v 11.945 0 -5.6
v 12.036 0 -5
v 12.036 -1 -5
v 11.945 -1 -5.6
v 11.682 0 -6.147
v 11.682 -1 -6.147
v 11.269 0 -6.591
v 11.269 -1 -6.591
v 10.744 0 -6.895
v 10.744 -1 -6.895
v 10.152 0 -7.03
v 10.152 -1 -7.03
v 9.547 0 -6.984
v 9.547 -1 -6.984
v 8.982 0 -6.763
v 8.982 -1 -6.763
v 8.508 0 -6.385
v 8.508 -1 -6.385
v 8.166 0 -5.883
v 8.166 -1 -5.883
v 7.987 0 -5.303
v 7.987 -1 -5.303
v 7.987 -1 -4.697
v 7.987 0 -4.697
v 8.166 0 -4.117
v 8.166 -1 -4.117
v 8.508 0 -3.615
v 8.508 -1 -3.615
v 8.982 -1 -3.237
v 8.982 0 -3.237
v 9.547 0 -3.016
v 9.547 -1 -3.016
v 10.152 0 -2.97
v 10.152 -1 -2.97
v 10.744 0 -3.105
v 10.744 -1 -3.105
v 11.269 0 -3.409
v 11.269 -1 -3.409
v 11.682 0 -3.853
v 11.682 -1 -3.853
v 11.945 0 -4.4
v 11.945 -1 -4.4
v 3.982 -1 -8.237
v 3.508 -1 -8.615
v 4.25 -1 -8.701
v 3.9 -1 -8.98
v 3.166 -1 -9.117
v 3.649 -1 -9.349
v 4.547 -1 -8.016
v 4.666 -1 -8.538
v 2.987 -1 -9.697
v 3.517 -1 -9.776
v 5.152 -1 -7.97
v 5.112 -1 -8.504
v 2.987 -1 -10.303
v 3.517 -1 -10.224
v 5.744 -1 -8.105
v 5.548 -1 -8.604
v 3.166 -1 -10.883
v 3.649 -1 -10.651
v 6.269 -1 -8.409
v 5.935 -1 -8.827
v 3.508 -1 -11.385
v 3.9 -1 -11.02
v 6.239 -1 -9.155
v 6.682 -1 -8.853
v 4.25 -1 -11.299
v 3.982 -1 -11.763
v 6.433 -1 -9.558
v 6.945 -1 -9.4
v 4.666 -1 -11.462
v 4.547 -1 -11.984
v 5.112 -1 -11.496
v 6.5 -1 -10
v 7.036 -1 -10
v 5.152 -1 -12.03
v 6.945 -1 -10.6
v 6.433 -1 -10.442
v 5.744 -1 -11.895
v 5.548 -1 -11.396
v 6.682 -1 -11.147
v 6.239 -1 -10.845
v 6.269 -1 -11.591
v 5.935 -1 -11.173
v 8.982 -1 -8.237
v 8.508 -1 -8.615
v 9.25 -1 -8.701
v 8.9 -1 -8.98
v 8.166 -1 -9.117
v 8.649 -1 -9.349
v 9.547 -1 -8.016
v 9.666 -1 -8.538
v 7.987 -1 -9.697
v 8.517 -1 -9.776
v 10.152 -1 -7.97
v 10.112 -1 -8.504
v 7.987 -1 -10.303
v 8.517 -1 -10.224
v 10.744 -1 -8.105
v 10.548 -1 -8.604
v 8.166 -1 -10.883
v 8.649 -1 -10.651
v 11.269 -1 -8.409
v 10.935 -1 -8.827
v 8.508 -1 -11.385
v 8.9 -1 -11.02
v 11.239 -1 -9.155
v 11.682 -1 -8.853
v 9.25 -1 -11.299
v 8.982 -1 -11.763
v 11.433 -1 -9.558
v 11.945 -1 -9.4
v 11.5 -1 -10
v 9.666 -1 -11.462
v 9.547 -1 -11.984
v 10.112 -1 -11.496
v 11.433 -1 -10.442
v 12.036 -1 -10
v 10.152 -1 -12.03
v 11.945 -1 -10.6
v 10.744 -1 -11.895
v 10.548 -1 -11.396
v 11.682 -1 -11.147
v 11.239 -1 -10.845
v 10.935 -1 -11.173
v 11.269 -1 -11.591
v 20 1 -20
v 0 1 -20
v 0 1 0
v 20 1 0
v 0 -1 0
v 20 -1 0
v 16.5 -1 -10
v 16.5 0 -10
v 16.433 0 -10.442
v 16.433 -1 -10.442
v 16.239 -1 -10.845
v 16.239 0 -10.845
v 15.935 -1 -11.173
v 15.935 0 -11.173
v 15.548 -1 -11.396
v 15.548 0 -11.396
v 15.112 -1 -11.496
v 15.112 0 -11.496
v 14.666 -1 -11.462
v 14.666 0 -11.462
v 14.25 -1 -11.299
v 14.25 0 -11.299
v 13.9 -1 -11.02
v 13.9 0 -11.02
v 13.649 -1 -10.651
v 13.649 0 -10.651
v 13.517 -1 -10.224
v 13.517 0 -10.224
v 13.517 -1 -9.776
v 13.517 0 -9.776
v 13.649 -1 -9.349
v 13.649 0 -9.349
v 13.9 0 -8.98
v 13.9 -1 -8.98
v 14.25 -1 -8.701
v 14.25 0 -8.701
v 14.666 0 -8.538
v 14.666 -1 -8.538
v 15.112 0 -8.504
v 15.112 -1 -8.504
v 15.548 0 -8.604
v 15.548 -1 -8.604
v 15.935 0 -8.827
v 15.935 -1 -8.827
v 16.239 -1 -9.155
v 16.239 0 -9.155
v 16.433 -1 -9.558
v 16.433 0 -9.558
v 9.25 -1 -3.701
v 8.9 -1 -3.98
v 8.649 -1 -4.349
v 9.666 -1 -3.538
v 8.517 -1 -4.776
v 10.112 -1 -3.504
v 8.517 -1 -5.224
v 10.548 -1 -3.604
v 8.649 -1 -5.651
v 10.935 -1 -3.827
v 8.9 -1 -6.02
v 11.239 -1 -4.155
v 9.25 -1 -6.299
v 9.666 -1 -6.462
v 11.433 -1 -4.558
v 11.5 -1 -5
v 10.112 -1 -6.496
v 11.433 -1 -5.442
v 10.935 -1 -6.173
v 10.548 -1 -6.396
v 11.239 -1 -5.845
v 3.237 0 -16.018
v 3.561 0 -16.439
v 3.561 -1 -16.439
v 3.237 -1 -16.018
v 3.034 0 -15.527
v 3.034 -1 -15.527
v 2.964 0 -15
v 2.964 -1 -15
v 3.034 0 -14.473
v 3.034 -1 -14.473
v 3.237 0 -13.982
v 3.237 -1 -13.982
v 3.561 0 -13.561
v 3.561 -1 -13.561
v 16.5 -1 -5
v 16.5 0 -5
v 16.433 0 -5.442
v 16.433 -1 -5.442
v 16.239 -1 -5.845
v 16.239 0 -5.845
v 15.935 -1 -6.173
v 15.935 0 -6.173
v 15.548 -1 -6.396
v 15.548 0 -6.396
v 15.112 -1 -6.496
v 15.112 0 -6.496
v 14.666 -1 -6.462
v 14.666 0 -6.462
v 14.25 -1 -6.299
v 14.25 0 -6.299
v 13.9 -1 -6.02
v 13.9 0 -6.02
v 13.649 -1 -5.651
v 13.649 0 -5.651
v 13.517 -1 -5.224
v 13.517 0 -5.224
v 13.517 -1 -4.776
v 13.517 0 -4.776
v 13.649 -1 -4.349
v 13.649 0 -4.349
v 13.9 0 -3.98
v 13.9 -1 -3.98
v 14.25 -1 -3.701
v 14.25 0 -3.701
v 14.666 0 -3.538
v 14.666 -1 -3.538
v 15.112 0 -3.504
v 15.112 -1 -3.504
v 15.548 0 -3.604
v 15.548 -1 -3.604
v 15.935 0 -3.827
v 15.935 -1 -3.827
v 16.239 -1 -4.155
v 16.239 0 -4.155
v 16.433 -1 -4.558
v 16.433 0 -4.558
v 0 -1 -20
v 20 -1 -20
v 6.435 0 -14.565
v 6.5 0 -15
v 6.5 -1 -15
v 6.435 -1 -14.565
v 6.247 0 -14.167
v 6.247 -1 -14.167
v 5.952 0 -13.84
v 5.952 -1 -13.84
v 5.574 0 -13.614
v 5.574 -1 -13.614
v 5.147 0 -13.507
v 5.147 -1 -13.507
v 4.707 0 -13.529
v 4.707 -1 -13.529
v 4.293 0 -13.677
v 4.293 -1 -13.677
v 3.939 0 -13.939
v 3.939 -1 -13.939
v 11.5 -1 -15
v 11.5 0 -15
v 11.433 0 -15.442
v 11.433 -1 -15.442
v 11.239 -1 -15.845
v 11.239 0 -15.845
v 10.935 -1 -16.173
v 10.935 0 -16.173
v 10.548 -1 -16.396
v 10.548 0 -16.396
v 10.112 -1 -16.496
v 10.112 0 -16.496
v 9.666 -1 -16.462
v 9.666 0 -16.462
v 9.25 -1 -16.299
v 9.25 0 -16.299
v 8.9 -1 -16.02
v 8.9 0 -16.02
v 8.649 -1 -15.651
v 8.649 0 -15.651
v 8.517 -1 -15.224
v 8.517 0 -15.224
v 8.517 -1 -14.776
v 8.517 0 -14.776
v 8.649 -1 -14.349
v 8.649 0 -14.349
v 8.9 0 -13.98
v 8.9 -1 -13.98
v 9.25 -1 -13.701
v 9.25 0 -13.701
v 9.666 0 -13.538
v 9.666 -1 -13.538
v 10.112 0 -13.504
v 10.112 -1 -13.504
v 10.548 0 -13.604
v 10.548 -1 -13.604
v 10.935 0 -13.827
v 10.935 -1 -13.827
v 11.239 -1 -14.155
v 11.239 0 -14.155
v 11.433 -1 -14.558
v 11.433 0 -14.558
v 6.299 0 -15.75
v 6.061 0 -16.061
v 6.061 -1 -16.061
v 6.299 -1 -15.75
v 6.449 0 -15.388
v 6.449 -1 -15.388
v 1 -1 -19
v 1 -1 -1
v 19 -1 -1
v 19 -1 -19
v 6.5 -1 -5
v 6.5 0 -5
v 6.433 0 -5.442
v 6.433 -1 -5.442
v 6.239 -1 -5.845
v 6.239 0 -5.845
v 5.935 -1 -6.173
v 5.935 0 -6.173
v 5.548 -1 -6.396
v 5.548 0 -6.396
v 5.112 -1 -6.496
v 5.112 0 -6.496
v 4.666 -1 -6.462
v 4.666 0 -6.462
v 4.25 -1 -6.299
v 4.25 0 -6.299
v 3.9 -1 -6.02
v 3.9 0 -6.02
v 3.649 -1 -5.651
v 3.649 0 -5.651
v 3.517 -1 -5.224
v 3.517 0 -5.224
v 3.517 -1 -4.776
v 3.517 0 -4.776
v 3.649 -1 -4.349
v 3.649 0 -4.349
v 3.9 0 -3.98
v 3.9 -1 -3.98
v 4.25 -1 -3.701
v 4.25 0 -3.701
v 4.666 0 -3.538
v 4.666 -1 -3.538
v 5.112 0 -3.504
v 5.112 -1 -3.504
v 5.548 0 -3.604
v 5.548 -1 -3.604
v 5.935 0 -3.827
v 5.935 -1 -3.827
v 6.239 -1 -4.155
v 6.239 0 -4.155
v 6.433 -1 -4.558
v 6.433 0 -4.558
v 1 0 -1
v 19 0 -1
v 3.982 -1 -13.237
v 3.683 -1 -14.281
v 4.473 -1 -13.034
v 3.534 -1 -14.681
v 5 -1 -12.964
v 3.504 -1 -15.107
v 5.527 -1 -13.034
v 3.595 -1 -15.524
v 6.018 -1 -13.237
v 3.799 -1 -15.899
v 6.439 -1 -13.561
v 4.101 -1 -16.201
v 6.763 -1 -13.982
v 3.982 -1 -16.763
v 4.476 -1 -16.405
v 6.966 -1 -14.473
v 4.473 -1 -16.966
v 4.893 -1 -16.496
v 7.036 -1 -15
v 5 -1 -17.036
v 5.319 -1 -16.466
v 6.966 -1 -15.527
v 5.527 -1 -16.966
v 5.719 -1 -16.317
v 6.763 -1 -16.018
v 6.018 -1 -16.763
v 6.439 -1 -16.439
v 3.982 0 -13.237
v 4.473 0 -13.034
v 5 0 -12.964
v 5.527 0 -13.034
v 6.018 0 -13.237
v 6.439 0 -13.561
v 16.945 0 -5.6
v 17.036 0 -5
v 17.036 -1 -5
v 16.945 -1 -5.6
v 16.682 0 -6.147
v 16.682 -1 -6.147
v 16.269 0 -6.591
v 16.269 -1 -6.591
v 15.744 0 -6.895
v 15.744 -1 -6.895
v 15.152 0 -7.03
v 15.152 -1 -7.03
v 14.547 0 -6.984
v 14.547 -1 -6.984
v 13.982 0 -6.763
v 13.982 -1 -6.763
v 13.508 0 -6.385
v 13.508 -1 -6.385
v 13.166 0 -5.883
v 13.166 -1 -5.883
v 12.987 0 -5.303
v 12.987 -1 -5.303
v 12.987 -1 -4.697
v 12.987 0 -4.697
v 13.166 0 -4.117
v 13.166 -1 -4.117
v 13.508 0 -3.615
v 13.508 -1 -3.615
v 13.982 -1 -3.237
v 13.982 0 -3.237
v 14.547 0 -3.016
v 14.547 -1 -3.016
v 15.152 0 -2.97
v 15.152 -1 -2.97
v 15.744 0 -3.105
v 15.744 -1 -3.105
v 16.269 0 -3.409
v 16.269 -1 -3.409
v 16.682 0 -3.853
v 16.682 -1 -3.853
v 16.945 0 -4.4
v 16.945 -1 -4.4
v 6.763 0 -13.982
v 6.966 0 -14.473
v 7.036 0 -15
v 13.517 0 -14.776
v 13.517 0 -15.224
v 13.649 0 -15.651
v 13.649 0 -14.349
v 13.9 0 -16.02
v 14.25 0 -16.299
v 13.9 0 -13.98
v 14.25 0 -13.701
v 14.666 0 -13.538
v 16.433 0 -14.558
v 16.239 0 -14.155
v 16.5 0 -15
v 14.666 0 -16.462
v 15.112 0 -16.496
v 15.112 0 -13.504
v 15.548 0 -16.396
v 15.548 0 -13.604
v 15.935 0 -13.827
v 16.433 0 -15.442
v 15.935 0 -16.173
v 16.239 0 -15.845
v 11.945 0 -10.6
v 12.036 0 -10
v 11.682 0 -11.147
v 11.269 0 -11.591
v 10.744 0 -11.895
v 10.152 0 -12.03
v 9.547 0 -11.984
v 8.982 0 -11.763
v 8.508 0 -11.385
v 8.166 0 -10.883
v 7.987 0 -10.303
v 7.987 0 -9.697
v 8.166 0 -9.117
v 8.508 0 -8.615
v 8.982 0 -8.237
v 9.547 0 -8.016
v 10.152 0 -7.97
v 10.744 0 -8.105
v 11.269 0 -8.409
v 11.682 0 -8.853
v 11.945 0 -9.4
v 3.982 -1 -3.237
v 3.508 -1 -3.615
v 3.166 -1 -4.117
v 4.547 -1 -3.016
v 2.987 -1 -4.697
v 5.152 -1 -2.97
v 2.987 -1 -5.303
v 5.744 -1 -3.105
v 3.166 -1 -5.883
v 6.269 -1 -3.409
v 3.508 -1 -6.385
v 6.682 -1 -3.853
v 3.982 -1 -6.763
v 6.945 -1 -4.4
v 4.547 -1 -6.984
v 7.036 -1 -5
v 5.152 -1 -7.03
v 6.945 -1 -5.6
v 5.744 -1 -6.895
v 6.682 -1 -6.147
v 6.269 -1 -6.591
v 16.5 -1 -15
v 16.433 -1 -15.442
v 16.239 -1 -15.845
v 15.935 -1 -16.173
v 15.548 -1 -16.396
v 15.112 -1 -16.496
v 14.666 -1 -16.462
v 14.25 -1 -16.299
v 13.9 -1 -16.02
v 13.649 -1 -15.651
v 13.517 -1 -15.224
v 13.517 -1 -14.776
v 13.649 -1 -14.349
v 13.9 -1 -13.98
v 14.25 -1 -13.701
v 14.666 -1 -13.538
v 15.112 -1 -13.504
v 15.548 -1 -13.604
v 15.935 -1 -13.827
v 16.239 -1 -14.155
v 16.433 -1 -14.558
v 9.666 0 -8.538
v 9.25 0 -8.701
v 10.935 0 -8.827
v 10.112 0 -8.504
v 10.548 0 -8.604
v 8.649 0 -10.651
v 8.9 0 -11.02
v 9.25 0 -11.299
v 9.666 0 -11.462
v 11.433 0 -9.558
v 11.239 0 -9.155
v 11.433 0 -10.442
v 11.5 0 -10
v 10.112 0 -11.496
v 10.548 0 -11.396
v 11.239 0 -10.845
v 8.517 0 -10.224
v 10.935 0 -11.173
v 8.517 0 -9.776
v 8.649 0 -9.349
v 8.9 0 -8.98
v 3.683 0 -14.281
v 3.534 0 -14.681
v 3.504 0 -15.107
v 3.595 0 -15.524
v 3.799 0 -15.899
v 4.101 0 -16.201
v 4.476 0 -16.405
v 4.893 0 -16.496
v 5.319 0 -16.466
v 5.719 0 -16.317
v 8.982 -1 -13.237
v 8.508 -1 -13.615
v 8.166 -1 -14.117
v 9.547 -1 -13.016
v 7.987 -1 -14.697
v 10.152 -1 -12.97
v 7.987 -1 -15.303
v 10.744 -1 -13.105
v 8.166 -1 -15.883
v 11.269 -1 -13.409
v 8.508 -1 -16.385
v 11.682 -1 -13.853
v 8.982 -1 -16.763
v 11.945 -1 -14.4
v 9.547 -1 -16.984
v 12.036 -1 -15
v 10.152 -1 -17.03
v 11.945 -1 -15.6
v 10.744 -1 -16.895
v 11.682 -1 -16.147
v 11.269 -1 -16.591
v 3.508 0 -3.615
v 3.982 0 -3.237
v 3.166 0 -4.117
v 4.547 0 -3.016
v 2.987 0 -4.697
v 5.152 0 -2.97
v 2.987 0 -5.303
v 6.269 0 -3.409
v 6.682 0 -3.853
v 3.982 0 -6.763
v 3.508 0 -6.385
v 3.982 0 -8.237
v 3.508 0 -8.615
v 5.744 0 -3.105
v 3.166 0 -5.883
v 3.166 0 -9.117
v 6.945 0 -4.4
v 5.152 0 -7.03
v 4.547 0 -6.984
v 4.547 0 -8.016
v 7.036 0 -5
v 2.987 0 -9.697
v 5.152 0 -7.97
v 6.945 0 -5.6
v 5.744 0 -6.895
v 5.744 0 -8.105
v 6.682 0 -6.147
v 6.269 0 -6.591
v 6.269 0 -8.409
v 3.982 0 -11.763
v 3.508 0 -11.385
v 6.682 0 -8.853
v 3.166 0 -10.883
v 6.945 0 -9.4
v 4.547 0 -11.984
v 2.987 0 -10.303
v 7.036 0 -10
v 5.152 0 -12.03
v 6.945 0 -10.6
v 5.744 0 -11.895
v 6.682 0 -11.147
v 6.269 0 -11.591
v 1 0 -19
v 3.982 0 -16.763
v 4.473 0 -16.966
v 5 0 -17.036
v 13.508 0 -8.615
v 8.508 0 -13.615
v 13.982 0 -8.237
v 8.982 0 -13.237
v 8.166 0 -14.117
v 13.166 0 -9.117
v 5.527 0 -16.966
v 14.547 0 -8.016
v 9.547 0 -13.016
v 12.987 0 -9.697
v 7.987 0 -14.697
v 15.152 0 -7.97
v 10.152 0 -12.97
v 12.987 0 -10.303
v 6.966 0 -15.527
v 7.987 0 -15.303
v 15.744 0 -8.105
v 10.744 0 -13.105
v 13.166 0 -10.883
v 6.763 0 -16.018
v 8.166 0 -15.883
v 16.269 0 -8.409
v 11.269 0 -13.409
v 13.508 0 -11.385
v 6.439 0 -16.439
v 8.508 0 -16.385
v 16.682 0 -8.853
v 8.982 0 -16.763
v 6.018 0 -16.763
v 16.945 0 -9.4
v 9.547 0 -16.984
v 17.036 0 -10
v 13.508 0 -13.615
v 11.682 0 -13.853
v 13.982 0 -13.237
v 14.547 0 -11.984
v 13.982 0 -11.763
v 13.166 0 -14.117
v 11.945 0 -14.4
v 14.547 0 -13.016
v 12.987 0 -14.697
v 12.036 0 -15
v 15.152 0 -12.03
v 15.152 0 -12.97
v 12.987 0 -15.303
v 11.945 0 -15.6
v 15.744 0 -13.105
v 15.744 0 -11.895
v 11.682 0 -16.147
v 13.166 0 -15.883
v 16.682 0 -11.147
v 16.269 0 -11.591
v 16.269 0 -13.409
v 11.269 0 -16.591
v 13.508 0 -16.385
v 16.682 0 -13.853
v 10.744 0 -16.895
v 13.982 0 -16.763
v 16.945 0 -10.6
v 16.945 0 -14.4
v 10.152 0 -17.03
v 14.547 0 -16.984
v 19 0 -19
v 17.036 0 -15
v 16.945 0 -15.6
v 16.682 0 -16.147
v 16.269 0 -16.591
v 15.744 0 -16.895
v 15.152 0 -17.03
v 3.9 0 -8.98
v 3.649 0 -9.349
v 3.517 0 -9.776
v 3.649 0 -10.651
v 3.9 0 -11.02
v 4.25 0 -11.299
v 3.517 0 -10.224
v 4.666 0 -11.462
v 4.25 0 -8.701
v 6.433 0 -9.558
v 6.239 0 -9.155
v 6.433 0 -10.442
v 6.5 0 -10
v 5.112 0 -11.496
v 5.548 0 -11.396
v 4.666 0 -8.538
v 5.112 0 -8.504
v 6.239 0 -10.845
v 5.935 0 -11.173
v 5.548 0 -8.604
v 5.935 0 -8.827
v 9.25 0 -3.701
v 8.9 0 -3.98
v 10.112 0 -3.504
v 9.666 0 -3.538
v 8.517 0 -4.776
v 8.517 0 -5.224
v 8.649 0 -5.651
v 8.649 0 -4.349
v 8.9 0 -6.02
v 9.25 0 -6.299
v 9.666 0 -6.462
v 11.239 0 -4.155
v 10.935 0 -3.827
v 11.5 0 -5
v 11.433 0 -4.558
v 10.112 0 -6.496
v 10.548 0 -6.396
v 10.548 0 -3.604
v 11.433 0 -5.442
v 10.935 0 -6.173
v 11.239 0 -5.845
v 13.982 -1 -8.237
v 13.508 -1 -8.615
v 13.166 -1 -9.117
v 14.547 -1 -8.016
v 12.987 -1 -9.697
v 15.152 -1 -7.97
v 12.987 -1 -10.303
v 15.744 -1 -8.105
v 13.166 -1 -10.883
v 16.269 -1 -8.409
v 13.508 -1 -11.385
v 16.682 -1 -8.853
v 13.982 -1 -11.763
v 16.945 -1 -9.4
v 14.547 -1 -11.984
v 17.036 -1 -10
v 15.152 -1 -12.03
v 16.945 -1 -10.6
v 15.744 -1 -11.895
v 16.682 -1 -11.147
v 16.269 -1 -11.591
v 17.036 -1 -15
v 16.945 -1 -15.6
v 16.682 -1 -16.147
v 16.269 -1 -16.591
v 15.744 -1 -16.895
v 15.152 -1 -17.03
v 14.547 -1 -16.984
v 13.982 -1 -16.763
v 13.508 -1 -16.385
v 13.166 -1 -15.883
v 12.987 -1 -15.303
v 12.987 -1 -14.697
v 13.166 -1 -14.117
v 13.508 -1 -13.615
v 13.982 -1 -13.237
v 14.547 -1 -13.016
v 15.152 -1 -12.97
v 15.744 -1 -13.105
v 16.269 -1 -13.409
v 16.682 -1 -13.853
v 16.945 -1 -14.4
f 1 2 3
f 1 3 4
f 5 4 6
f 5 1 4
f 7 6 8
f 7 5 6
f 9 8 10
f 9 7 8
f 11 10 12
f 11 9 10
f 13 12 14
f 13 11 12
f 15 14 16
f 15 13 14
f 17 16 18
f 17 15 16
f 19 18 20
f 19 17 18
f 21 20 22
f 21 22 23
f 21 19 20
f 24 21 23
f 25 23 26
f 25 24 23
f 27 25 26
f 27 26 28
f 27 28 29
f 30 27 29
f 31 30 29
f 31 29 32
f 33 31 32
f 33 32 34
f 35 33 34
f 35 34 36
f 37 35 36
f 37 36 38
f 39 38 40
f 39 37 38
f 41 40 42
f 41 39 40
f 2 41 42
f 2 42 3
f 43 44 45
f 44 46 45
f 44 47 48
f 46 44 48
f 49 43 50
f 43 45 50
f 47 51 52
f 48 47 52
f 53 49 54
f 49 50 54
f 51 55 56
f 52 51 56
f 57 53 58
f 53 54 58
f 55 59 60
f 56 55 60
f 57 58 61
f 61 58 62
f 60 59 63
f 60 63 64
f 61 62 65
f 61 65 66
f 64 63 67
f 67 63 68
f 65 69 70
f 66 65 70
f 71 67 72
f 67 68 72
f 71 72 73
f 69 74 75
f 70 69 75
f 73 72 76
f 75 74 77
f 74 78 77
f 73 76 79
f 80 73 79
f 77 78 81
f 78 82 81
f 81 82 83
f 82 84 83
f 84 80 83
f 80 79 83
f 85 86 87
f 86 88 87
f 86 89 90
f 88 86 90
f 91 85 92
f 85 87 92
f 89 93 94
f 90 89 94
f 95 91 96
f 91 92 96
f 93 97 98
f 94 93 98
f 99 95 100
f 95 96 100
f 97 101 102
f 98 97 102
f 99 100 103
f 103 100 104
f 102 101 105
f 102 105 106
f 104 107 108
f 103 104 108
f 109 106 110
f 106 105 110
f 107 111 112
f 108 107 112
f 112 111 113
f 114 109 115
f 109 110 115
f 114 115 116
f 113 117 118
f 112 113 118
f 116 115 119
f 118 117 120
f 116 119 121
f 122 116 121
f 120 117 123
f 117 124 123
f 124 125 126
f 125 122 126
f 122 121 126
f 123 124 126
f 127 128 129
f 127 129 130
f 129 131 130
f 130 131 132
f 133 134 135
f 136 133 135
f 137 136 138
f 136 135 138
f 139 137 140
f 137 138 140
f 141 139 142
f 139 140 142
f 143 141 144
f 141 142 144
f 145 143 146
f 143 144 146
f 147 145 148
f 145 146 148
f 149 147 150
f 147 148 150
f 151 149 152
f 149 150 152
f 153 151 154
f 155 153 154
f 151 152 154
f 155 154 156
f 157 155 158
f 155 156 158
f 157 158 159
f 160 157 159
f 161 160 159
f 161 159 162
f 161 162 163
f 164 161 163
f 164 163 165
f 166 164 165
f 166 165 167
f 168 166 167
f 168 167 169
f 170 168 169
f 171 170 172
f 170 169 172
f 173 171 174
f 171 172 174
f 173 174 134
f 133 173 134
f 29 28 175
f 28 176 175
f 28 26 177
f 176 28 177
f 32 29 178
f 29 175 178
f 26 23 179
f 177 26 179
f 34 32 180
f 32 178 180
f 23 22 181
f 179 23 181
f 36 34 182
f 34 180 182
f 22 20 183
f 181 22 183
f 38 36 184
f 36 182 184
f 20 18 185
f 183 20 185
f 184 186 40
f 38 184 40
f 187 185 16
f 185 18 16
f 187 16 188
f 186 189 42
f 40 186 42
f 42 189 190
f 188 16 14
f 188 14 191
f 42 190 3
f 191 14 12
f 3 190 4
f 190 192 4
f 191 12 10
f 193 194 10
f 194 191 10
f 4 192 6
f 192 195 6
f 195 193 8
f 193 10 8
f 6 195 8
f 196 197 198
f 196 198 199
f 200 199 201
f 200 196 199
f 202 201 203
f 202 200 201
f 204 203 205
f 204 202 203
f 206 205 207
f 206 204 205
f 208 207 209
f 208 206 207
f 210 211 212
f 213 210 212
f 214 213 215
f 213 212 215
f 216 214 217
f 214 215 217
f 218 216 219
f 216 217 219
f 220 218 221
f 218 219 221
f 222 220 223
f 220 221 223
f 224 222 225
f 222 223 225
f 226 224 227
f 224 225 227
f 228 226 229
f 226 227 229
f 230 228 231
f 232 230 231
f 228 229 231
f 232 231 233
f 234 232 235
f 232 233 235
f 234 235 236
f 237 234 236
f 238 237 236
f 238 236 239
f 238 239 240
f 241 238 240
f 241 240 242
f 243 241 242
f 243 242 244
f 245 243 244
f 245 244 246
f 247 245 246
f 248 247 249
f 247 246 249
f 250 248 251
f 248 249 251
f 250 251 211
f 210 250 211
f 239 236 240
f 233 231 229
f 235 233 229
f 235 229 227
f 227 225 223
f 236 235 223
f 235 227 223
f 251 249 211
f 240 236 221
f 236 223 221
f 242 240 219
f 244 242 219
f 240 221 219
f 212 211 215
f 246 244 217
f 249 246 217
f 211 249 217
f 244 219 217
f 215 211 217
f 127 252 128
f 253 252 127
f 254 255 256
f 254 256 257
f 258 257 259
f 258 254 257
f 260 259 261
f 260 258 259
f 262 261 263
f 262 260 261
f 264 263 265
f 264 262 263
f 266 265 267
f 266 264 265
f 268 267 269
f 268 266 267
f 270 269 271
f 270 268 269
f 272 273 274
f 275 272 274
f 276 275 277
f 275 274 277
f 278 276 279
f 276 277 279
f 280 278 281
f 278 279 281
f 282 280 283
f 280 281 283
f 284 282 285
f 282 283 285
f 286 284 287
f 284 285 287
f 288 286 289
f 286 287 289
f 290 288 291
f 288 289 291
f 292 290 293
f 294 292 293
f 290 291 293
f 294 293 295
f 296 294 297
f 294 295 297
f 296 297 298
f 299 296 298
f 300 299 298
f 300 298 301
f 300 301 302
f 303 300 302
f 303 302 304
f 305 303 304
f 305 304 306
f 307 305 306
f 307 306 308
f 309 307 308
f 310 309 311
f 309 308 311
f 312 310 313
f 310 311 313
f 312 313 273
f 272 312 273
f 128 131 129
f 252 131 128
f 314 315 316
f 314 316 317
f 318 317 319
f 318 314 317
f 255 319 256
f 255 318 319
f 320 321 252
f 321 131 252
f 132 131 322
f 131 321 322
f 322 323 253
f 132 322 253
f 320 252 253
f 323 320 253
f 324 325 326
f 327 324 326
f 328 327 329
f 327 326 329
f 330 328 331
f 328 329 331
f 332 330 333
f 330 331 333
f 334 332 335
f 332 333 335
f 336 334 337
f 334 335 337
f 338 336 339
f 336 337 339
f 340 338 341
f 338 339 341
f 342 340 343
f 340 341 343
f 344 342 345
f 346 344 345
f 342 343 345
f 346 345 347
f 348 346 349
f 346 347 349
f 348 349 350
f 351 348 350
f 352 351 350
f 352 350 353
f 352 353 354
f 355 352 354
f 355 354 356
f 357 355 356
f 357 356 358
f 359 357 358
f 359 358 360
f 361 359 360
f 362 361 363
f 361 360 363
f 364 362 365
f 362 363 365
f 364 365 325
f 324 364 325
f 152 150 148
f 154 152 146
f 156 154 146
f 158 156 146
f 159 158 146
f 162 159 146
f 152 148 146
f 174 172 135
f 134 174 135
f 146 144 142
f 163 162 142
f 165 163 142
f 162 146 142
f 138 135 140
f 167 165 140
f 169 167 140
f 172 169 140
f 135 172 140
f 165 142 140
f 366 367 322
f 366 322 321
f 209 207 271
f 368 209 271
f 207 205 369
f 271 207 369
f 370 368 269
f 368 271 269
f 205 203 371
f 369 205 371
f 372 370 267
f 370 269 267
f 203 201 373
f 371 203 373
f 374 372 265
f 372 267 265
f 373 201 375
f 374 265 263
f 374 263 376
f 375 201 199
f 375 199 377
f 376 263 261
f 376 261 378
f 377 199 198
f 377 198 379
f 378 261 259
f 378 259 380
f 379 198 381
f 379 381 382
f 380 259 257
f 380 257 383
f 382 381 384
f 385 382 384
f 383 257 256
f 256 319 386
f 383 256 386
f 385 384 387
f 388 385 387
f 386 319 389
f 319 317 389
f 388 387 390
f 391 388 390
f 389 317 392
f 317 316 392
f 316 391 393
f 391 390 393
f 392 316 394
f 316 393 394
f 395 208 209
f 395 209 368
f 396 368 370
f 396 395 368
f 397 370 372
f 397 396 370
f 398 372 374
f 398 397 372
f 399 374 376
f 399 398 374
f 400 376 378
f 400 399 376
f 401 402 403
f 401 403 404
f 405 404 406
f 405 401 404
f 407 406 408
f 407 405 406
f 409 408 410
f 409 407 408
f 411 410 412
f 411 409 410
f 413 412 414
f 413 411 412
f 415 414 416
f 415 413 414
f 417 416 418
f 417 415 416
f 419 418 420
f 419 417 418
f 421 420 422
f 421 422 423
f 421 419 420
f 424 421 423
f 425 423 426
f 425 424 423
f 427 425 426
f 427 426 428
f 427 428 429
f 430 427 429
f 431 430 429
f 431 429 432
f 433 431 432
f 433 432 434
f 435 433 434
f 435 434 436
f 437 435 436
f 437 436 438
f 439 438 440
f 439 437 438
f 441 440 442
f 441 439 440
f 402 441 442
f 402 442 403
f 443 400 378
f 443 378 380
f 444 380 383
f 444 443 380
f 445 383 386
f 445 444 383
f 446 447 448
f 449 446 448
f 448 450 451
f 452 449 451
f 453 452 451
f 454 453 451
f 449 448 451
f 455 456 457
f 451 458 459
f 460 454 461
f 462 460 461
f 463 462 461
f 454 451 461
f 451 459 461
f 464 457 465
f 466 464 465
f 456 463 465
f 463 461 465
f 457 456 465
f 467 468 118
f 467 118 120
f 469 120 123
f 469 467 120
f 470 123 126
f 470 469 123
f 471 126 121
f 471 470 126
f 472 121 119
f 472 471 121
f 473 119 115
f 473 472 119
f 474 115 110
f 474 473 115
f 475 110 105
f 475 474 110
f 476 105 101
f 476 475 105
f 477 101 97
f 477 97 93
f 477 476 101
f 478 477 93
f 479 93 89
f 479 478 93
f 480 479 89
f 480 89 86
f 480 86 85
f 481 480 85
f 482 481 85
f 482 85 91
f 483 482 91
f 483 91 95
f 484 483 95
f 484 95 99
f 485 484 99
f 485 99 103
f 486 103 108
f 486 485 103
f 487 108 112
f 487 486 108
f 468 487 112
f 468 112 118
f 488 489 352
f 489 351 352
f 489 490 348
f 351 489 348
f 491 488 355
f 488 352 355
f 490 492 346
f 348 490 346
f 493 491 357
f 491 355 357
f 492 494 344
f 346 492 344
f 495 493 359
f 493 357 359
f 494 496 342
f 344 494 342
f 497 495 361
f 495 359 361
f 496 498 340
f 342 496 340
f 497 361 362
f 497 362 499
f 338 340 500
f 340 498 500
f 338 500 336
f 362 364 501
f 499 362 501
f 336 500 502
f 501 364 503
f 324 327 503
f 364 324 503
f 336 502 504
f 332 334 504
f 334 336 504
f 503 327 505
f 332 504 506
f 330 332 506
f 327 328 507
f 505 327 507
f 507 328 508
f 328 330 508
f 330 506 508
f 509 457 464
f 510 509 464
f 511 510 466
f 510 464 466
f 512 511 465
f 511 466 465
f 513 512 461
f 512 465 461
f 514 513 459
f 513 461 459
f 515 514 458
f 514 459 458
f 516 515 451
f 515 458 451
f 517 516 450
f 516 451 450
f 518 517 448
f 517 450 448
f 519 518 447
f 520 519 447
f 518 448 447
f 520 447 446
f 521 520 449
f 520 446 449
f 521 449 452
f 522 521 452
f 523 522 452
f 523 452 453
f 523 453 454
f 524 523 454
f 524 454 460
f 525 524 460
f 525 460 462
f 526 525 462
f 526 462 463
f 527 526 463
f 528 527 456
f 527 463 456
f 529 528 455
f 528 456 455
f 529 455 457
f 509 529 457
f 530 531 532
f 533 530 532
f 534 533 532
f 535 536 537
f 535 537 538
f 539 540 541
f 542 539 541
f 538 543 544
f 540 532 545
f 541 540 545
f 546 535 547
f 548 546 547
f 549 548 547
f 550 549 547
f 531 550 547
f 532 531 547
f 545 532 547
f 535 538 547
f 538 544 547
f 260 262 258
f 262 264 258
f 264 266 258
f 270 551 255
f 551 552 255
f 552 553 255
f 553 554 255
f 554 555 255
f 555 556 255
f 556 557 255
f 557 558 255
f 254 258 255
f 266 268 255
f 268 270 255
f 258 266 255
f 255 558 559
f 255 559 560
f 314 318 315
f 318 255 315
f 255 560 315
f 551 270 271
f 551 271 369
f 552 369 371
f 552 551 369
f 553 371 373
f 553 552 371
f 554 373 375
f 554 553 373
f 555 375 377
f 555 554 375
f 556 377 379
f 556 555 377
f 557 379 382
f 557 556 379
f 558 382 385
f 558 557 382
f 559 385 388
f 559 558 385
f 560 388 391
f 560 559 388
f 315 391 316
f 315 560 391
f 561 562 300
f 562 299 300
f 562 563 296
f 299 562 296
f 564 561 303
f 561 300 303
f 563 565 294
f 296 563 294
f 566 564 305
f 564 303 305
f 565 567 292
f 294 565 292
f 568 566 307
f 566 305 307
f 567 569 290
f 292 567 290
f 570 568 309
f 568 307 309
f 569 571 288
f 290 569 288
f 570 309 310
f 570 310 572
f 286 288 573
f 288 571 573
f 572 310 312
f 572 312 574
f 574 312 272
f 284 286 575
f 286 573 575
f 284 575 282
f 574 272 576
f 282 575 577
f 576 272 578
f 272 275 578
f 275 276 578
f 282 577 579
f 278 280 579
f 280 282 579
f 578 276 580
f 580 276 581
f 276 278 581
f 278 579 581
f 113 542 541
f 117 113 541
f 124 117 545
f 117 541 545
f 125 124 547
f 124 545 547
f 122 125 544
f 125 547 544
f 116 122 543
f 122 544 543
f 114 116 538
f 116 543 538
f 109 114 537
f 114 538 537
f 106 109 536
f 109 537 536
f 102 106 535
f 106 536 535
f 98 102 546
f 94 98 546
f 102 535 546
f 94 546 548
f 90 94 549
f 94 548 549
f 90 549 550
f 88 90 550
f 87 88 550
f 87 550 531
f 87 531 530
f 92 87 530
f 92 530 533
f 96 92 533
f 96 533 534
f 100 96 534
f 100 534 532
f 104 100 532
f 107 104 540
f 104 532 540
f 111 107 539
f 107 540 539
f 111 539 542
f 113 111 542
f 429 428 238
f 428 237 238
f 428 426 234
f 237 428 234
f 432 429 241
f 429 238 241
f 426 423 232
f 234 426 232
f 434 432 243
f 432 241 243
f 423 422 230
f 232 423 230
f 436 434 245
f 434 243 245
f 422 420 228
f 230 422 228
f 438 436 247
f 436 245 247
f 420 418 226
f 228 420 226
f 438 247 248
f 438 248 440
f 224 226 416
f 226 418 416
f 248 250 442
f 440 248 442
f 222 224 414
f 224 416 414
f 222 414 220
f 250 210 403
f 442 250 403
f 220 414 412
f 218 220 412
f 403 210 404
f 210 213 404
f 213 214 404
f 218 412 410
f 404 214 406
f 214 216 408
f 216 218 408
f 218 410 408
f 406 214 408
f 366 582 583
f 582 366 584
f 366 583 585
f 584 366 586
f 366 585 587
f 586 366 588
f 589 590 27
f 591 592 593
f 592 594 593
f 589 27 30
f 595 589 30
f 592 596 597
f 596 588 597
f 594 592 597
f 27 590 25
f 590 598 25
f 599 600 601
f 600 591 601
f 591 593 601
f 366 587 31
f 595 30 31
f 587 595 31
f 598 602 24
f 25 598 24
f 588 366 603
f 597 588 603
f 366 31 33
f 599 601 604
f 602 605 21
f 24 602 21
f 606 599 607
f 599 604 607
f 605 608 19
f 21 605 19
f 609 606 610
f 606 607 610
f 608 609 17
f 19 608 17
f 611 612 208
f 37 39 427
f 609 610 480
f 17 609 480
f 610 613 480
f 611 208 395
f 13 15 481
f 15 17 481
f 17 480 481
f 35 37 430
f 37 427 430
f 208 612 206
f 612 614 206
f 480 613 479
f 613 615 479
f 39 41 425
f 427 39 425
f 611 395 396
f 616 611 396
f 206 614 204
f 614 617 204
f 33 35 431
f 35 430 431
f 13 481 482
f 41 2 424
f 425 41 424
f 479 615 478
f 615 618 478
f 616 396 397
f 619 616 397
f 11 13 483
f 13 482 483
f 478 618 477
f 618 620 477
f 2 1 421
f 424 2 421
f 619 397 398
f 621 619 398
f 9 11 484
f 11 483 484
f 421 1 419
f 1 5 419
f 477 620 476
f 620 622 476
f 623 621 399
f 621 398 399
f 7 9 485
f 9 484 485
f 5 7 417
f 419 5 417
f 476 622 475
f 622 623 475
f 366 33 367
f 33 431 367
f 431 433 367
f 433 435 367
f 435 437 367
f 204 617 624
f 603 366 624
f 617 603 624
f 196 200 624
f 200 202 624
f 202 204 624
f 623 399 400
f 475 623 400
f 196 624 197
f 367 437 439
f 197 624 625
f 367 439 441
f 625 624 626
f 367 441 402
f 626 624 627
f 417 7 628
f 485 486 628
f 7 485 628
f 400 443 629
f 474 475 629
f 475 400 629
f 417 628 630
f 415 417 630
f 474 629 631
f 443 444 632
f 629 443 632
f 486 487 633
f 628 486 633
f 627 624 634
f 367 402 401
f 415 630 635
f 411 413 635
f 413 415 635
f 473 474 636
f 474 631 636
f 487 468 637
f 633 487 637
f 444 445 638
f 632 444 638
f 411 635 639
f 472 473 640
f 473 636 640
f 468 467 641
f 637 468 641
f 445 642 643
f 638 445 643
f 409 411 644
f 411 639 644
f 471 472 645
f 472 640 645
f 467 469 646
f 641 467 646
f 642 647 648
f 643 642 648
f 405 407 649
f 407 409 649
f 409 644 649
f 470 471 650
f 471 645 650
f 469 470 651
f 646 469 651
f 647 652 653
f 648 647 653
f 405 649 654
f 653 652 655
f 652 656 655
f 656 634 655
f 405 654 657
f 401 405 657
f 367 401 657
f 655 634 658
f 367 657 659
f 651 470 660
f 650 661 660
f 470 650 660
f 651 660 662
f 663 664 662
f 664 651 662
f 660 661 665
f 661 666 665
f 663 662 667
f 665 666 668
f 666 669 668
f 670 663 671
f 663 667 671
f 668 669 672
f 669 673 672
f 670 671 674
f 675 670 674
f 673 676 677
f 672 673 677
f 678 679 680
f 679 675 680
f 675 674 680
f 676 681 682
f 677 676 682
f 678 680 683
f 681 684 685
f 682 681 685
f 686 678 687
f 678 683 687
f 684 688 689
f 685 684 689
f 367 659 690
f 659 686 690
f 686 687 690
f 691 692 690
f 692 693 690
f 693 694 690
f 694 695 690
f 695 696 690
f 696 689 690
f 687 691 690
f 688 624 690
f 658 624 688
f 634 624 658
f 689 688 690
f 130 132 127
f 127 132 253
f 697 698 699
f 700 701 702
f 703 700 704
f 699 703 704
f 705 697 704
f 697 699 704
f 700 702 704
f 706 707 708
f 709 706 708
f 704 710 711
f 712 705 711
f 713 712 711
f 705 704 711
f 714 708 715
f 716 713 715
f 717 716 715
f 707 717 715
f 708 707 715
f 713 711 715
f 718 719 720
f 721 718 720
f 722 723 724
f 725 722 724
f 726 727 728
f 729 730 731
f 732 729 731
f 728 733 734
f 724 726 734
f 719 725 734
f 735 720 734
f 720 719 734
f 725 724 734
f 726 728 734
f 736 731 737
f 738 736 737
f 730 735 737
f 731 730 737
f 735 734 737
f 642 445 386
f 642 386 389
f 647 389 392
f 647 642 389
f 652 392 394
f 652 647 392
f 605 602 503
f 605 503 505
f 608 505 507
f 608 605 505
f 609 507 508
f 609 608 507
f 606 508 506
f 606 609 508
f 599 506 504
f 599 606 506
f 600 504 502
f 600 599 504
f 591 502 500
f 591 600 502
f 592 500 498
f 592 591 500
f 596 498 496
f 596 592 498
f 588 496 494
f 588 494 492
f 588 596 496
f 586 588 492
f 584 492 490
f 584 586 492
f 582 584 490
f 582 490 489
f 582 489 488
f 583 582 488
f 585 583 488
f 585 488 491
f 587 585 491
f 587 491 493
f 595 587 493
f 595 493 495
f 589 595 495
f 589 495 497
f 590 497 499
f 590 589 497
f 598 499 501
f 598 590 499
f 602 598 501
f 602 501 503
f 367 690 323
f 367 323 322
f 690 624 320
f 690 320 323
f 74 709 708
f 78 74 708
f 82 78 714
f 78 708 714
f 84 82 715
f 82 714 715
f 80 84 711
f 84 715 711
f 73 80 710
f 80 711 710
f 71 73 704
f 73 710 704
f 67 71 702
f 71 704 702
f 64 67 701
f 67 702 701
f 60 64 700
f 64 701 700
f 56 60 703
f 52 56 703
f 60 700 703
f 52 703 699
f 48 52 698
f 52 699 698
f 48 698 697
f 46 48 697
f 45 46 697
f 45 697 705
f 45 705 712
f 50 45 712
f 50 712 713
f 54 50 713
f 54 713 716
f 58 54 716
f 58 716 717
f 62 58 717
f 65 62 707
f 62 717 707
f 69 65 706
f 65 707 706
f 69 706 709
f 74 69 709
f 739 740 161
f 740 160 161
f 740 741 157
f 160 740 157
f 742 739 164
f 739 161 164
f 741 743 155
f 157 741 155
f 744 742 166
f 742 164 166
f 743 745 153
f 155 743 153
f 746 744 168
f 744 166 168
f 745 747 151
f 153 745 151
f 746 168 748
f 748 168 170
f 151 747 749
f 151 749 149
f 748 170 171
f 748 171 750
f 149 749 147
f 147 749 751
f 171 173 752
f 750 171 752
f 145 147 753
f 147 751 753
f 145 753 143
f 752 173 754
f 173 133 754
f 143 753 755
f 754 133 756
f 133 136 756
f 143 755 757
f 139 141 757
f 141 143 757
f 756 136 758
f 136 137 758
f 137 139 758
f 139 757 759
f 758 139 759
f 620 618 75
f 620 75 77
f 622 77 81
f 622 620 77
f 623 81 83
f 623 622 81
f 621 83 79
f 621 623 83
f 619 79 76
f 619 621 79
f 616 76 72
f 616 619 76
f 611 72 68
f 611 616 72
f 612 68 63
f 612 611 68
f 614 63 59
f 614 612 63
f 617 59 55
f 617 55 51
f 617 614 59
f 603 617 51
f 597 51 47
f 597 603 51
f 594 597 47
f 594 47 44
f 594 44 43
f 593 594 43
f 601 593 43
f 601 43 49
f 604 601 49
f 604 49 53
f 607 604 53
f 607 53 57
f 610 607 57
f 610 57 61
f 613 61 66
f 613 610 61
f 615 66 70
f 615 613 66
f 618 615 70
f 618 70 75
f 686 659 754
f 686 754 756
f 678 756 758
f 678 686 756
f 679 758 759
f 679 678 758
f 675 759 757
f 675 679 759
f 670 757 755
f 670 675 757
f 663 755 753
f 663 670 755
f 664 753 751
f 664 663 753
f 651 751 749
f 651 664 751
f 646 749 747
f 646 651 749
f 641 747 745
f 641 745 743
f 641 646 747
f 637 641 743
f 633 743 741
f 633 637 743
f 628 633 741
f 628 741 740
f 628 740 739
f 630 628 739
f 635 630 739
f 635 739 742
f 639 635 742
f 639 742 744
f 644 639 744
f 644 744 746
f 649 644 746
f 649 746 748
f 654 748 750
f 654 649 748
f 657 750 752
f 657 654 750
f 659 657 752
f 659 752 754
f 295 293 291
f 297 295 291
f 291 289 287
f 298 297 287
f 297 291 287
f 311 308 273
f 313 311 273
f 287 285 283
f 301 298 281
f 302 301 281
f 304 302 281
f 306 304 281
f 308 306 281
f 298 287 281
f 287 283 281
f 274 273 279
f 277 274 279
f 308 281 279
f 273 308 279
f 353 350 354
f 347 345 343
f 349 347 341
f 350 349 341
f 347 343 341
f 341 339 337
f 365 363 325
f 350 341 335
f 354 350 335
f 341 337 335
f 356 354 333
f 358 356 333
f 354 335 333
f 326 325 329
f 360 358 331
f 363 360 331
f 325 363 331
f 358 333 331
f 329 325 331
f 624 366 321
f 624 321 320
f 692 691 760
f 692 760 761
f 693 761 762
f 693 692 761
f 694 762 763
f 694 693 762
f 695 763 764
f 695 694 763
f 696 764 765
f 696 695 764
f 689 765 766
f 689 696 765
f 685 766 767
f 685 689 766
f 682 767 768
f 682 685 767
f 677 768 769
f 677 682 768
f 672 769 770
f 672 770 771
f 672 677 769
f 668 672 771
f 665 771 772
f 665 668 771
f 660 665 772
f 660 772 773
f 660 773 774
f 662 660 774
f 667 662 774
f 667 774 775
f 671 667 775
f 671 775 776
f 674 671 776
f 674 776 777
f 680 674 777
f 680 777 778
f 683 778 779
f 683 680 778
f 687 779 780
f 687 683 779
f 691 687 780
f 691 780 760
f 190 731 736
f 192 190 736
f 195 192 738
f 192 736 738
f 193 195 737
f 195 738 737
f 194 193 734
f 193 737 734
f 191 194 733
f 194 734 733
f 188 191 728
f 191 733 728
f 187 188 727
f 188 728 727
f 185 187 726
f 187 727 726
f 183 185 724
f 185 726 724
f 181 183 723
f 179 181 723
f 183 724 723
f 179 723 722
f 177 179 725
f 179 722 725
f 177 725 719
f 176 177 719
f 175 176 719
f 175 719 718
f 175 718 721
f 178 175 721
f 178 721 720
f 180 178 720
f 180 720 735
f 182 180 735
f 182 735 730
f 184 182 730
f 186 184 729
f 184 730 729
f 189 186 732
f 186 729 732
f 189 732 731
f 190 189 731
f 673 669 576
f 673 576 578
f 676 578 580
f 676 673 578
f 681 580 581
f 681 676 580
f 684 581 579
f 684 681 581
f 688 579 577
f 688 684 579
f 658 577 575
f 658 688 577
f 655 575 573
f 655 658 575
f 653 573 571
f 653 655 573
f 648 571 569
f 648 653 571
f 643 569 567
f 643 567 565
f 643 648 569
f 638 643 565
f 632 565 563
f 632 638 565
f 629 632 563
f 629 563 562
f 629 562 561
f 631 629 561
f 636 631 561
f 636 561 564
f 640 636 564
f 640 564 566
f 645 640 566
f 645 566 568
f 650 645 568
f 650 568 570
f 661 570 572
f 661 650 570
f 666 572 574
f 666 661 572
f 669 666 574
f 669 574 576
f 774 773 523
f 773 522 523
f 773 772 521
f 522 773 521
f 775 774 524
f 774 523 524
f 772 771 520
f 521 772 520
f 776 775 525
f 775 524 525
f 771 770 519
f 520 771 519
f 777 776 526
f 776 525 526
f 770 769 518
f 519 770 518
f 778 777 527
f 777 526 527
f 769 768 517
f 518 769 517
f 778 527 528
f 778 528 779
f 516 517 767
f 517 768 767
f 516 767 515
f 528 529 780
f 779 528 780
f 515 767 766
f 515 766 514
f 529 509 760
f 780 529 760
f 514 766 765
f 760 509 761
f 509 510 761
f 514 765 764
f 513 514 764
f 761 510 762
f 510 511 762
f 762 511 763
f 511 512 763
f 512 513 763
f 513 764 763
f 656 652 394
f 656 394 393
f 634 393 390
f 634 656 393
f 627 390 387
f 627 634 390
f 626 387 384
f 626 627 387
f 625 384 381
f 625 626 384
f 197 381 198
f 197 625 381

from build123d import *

# Parameters (mm, degrees)
SKETCH1_R              = 2.035533906
SKETCH1_R_2            = 1.5
BOSS_EXTRUDE1_DEPTH    = 1
SKETCH1_W              = 20
SKETCH1_H              = 20
SKETCH1_W_2            = 18
SKETCH1_H_2            = 18
BOSS_EXTRUDE1_2_DEPTH  = 1
BOSS_EXTRUDE1_3_DEPTH  = 1
BOSS_EXTRUDE1_4_DEPTH  = 1
BOSS_EXTRUDE1_5_DEPTH  = 1
BOSS_EXTRUDE1_6_DEPTH  = 1
BOSS_EXTRUDE1_7_DEPTH  = 1
BOSS_EXTRUDE1_8_DEPTH  = 1
BOSS_EXTRUDE1_9_DEPTH  = 1
BOSS_EXTRUDE1_10_DEPTH = 1
SKETCH1_3_W            = 20
SKETCH1_3_H            = 20
BOSS_EXTRUDE2_DEPTH    = 1


with BuildPart() as part:
    # Sketch1 → Boss-Extrude1 (new body)
    with BuildSketch(Plane(origin=(0, 0, 0), x_dir=(1, 0, 0), z_dir=(0, 1, 0))):
        with Locations((5, 15)):
            Circle(SKETCH1_R)
        with Locations((5, 15)):
            Circle(SKETCH1_R_2, mode=Mode.SUBTRACT)
    extrude(amount=-BOSS_EXTRUDE1_DEPTH)



with BuildPart() as body_2:
    # Sketch1 → Boss-Extrude1 2 (new body)
    with BuildSketch(Plane(origin=(0, 0, 0), x_dir=(1, 0, 0), z_dir=(0, 1, 0))):
        with Locations((10, 10)):
            Rectangle(SKETCH1_W, SKETCH1_H)
        with Locations((10, 10)):
            Rectangle(SKETCH1_W_2, SKETCH1_H_2, mode=Mode.SUBTRACT)
    extrude(amount=-BOSS_EXTRUDE1_2_DEPTH)


with BuildPart() as body_3:
    # Sketch1 → Boss-Extrude1 3 (new body)
    with BuildSketch(Plane(origin=(0, 0, 0), x_dir=(1, 0, 0), z_dir=(0, 1, 0))):
        with Locations((5, 10)):
            Circle(SKETCH1_R)
        with Locations((5, 10)):
            Circle(SKETCH1_R_2, mode=Mode.SUBTRACT)
    extrude(amount=-BOSS_EXTRUDE1_3_DEPTH)


with BuildPart() as body_4:
    # Sketch1 → Boss-Extrude1 4 (new body)
    with BuildSketch(Plane(origin=(0, 0, 0), x_dir=(1, 0, 0), z_dir=(0, 1, 0))):
        with Locations((10, 15)):
            Circle(SKETCH1_R)
        with Locations((10, 15)):
            Circle(SKETCH1_R_2, mode=Mode.SUBTRACT)
    extrude(amount=-BOSS_EXTRUDE1_4_DEPTH)


with BuildPart() as body_5:
    # Sketch1 → Boss-Extrude1 5 (new body)
    with BuildSketch(Plane(origin=(0, 0, 0), x_dir=(1, 0, 0), z_dir=(0, 1, 0))):
        with Locations((5, 5)):
            Circle(SKETCH1_R)
        with Locations((5, 5)):
            Circle(SKETCH1_R_2, mode=Mode.SUBTRACT)
    extrude(amount=-BOSS_EXTRUDE1_5_DEPTH)


with BuildPart() as body_6:
    # Sketch1 → Boss-Extrude1 6 (new body)
    with BuildSketch(Plane(origin=(0, 0, 0), x_dir=(1, 0, 0), z_dir=(0, 1, 0))):
        with Locations((10, 10)):
            Circle(SKETCH1_R)
        with Locations((10, 10)):
            Circle(SKETCH1_R_2, mode=Mode.SUBTRACT)
    extrude(amount=-BOSS_EXTRUDE1_6_DEPTH)


with BuildPart() as body_7:
    # Sketch1 → Boss-Extrude1 7 (new body)
    with BuildSketch(Plane(origin=(0, 0, 0), x_dir=(1, 0, 0), z_dir=(0, 1, 0))):
        with Locations((15, 15)):
            Circle(SKETCH1_R)
        with Locations((15, 15)):
            Circle(SKETCH1_R_2, mode=Mode.SUBTRACT)
    extrude(amount=-BOSS_EXTRUDE1_7_DEPTH)


with BuildPart() as body_8:
    # Sketch1 → Boss-Extrude1 8 (new body)
    with BuildSketch(Plane(origin=(0, 0, 0), x_dir=(1, 0, 0), z_dir=(0, 1, 0))):
        with Locations((10, 5)):
            Circle(SKETCH1_R)
        with Locations((10, 5)):
            Circle(SKETCH1_R_2, mode=Mode.SUBTRACT)
    extrude(amount=-BOSS_EXTRUDE1_8_DEPTH)


with BuildPart() as body_9:
    # Sketch1 → Boss-Extrude1 9 (new body)
    with BuildSketch(Plane(origin=(0, 0, 0), x_dir=(1, 0, 0), z_dir=(0, 1, 0))):
        with Locations((15, 10)):
            Circle(SKETCH1_R)
        with Locations((15, 10)):
            Circle(SKETCH1_R_2, mode=Mode.SUBTRACT)
    extrude(amount=-BOSS_EXTRUDE1_9_DEPTH)


with BuildPart() as body_10:
    # Sketch1 → Boss-Extrude1 10 (new body)
    with BuildSketch(Plane(origin=(0, 0, 0), x_dir=(1, 0, 0), z_dir=(0, 1, 0))):
        with Locations((15, 5)):
            Circle(SKETCH1_R)
        with Locations((15, 5)):
            Circle(SKETCH1_R_2, mode=Mode.SUBTRACT)
    extrude(amount=-BOSS_EXTRUDE1_10_DEPTH)


with BuildPart() as part_1:
    add(part.part)

    add(body_2.part)  # Boss-Extrude2 merges body 2

    add(body_3.part)  # Boss-Extrude2 merges body 3

    add(body_4.part)  # Boss-Extrude2 merges body 4

    add(body_5.part)  # Boss-Extrude2 merges body 5

    add(body_6.part)  # Boss-Extrude2 merges body 6

    add(body_7.part)  # Boss-Extrude2 merges body 7

    add(body_8.part)  # Boss-Extrude2 merges body 8

    add(body_9.part)  # Boss-Extrude2 merges body 9

    add(body_10.part)  # Boss-Extrude2 merges body 10
    # Sketch1<3> → Boss-Extrude2 (add)
    with BuildSketch(Plane(origin=(0, 0, 0), x_dir=(1, 0, 0), z_dir=(0, 1, 0))):
        with Locations((10, 10)):
            Rectangle(SKETCH1_3_W, SKETCH1_3_H)
    extrude(amount=BOSS_EXTRUDE2_DEPTH)


solid = part_1.part
